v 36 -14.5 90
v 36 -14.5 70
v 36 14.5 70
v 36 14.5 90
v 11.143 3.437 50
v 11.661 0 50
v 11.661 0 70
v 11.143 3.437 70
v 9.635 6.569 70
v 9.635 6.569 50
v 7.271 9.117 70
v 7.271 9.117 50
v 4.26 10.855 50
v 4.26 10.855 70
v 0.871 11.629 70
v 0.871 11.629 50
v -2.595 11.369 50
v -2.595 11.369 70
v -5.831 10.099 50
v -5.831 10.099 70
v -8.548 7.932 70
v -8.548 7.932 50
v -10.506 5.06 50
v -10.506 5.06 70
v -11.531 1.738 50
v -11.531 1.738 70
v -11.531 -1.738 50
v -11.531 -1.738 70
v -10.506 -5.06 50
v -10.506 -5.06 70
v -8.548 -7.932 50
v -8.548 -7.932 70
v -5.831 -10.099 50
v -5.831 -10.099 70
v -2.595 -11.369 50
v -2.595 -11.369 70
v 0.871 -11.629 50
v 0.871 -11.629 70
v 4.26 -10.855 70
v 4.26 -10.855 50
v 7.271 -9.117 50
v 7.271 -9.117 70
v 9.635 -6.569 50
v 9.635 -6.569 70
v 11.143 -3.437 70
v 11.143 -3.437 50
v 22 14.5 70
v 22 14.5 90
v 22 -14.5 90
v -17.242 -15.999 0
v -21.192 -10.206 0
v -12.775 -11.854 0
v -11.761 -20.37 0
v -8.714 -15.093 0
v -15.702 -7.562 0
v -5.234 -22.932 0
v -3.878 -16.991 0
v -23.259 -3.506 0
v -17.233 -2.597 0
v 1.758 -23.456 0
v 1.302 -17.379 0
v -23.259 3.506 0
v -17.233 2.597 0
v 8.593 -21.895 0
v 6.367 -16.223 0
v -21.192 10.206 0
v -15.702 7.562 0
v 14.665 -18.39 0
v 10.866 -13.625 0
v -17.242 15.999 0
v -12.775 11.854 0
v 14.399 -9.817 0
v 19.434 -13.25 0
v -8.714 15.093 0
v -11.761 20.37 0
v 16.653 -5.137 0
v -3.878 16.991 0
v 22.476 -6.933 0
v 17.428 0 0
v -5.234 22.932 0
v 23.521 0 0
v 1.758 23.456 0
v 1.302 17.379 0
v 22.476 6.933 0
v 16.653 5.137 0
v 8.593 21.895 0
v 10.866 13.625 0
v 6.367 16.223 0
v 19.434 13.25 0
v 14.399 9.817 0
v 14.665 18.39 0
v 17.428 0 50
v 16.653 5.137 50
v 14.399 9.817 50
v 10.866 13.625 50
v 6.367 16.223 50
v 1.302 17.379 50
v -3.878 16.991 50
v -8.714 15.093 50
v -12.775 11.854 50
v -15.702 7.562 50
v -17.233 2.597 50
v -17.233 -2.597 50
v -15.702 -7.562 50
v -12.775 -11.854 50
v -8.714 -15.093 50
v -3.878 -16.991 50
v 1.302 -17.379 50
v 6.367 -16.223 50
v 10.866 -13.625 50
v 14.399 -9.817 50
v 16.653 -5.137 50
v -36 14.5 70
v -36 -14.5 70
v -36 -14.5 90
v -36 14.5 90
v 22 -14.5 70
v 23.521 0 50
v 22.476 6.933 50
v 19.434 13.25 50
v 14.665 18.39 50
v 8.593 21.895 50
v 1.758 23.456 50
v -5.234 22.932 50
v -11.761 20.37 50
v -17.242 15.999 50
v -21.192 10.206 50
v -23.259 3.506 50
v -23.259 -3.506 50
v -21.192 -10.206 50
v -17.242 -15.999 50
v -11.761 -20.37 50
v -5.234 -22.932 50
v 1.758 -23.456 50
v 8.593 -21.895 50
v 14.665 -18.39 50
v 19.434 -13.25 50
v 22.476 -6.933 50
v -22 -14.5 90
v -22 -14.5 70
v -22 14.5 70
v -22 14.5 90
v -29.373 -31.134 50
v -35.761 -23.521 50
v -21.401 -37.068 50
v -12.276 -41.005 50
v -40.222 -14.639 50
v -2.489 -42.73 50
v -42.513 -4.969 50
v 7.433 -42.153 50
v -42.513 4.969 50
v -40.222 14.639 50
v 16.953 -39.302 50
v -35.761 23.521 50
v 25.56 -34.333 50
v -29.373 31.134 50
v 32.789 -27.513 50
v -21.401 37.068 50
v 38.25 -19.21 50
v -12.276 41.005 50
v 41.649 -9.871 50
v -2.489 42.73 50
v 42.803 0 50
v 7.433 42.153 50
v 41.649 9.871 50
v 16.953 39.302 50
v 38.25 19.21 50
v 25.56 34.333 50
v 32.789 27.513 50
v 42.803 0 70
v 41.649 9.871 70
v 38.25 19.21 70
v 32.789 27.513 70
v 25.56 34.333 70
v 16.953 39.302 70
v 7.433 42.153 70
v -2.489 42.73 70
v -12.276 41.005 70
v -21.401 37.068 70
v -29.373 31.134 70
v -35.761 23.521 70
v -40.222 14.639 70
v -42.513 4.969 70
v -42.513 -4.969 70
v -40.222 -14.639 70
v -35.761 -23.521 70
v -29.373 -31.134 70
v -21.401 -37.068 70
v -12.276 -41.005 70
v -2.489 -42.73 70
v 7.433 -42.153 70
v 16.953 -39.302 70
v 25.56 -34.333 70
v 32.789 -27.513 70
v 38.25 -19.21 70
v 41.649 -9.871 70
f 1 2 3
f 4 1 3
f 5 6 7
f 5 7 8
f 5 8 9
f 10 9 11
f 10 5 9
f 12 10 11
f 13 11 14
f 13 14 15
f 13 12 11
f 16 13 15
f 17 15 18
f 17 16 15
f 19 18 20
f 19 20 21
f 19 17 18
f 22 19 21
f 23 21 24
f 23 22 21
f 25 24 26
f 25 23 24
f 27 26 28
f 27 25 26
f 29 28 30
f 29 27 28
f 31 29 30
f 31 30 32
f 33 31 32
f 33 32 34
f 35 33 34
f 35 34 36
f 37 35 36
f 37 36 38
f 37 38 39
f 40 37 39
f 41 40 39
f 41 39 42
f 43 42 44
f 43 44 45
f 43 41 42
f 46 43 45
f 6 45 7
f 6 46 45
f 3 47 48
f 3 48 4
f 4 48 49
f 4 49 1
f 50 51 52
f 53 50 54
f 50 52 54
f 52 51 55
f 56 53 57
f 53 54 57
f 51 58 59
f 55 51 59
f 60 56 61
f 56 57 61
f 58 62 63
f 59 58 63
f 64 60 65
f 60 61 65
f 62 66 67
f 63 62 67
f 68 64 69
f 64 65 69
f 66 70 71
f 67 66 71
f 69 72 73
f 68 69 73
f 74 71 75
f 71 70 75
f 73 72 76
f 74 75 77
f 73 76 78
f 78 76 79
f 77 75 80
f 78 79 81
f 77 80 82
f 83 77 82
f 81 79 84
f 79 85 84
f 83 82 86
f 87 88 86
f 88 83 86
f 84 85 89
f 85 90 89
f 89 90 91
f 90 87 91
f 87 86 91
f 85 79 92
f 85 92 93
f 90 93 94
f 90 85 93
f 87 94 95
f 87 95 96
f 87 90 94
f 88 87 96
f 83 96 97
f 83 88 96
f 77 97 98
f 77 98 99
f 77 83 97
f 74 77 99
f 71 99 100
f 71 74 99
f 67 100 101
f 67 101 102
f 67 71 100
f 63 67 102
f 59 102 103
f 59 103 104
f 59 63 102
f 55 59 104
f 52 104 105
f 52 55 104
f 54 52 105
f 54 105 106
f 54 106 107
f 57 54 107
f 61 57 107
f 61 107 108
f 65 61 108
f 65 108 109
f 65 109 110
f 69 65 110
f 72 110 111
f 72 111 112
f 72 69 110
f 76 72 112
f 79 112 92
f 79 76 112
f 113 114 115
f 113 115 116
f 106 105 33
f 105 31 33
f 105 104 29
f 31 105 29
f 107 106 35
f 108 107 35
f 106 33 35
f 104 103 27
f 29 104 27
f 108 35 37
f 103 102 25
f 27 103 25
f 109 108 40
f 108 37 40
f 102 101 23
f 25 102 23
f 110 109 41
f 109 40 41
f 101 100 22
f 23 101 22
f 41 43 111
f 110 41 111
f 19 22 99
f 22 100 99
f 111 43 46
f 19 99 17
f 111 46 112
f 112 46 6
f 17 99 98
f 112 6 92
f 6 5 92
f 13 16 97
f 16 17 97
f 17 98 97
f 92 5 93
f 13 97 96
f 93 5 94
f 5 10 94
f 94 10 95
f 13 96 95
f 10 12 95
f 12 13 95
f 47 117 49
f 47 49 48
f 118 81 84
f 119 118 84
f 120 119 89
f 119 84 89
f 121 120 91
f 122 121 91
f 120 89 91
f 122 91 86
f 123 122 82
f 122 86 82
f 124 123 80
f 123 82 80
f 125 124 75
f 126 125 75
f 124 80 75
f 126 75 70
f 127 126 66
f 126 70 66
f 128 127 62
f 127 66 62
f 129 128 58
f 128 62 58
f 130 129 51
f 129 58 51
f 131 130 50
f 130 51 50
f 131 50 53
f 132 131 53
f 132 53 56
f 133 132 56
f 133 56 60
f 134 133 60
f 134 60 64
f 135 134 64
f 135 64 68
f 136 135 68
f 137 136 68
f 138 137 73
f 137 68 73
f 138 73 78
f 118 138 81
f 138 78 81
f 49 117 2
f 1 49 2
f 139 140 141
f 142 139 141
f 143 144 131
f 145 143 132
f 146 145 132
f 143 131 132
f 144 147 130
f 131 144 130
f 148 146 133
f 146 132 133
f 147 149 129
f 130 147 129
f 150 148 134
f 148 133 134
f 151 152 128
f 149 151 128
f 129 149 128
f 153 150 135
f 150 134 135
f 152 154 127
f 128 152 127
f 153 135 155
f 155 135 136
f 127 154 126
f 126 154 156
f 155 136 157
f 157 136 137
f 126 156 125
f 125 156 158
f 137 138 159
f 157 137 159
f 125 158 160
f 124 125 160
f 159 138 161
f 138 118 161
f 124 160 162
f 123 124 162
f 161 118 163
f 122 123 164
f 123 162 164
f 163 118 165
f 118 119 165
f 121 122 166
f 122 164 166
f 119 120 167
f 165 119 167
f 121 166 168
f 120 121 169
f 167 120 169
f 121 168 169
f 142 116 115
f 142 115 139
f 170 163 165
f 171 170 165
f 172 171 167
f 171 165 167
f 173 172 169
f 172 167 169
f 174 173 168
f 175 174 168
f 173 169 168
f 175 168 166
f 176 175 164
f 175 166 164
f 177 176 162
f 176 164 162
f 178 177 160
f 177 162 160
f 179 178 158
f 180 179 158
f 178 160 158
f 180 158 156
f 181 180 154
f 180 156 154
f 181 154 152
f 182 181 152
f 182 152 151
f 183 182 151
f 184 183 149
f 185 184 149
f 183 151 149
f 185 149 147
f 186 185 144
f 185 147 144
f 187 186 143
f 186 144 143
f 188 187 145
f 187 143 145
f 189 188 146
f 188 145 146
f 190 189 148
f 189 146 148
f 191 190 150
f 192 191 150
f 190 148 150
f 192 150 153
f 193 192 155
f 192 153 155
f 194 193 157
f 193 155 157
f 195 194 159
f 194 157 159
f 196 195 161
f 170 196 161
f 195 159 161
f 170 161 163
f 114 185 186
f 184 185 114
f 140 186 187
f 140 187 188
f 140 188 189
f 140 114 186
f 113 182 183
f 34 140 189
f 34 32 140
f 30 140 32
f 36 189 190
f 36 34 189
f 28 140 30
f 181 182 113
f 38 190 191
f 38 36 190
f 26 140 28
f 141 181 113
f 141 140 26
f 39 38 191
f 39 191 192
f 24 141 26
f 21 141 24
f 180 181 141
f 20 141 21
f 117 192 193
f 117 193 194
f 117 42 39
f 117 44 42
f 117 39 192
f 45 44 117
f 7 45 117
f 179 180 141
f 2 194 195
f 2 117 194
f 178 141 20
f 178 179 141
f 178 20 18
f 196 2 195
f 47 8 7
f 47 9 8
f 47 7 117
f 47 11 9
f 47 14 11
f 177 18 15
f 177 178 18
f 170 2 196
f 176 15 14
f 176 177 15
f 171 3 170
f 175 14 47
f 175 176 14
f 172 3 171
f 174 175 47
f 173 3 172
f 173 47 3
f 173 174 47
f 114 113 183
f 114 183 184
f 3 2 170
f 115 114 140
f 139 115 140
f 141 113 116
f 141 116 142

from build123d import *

# Parameters (mm, degrees)
SKETCH_R      = 23.521413
SKETCH_R_2    = 17.427543
PAD_DEPTH     = 50
SKETCH001_R   = 42.802844
SKETCH001_R_2 = 11.661281
PAD001_DEPTH  = 20
SKETCH002_W   = 14
SKETCH002_H   = 29
PAD002_DEPTH  = 20


with BuildPart() as part:
    # Sketch → Pad (new body)
    with BuildSketch(Plane.XY):
        Circle(SKETCH_R)
        Circle(SKETCH_R_2, mode=Mode.SUBTRACT)
    extrude(amount=PAD_DEPTH)

    # Sketch001 → Pad001 (new body)
    with BuildSketch(Plane.XY.offset(50)):
        Circle(SKETCH001_R)
        Circle(SKETCH001_R_2, mode=Mode.SUBTRACT)
    extrude(amount=PAD001_DEPTH)

    # Sketch002 → Pad002 (new body)
    with BuildSketch(Plane.XY.offset(70)):
        with Locations((-29, 0)):
            Rectangle(SKETCH002_W, SKETCH002_H)
        with Locations((29, 0)):
            Rectangle(SKETCH002_W, SKETCH002_H)
    extrude(amount=PAD002_DEPTH)


solid = part.part
